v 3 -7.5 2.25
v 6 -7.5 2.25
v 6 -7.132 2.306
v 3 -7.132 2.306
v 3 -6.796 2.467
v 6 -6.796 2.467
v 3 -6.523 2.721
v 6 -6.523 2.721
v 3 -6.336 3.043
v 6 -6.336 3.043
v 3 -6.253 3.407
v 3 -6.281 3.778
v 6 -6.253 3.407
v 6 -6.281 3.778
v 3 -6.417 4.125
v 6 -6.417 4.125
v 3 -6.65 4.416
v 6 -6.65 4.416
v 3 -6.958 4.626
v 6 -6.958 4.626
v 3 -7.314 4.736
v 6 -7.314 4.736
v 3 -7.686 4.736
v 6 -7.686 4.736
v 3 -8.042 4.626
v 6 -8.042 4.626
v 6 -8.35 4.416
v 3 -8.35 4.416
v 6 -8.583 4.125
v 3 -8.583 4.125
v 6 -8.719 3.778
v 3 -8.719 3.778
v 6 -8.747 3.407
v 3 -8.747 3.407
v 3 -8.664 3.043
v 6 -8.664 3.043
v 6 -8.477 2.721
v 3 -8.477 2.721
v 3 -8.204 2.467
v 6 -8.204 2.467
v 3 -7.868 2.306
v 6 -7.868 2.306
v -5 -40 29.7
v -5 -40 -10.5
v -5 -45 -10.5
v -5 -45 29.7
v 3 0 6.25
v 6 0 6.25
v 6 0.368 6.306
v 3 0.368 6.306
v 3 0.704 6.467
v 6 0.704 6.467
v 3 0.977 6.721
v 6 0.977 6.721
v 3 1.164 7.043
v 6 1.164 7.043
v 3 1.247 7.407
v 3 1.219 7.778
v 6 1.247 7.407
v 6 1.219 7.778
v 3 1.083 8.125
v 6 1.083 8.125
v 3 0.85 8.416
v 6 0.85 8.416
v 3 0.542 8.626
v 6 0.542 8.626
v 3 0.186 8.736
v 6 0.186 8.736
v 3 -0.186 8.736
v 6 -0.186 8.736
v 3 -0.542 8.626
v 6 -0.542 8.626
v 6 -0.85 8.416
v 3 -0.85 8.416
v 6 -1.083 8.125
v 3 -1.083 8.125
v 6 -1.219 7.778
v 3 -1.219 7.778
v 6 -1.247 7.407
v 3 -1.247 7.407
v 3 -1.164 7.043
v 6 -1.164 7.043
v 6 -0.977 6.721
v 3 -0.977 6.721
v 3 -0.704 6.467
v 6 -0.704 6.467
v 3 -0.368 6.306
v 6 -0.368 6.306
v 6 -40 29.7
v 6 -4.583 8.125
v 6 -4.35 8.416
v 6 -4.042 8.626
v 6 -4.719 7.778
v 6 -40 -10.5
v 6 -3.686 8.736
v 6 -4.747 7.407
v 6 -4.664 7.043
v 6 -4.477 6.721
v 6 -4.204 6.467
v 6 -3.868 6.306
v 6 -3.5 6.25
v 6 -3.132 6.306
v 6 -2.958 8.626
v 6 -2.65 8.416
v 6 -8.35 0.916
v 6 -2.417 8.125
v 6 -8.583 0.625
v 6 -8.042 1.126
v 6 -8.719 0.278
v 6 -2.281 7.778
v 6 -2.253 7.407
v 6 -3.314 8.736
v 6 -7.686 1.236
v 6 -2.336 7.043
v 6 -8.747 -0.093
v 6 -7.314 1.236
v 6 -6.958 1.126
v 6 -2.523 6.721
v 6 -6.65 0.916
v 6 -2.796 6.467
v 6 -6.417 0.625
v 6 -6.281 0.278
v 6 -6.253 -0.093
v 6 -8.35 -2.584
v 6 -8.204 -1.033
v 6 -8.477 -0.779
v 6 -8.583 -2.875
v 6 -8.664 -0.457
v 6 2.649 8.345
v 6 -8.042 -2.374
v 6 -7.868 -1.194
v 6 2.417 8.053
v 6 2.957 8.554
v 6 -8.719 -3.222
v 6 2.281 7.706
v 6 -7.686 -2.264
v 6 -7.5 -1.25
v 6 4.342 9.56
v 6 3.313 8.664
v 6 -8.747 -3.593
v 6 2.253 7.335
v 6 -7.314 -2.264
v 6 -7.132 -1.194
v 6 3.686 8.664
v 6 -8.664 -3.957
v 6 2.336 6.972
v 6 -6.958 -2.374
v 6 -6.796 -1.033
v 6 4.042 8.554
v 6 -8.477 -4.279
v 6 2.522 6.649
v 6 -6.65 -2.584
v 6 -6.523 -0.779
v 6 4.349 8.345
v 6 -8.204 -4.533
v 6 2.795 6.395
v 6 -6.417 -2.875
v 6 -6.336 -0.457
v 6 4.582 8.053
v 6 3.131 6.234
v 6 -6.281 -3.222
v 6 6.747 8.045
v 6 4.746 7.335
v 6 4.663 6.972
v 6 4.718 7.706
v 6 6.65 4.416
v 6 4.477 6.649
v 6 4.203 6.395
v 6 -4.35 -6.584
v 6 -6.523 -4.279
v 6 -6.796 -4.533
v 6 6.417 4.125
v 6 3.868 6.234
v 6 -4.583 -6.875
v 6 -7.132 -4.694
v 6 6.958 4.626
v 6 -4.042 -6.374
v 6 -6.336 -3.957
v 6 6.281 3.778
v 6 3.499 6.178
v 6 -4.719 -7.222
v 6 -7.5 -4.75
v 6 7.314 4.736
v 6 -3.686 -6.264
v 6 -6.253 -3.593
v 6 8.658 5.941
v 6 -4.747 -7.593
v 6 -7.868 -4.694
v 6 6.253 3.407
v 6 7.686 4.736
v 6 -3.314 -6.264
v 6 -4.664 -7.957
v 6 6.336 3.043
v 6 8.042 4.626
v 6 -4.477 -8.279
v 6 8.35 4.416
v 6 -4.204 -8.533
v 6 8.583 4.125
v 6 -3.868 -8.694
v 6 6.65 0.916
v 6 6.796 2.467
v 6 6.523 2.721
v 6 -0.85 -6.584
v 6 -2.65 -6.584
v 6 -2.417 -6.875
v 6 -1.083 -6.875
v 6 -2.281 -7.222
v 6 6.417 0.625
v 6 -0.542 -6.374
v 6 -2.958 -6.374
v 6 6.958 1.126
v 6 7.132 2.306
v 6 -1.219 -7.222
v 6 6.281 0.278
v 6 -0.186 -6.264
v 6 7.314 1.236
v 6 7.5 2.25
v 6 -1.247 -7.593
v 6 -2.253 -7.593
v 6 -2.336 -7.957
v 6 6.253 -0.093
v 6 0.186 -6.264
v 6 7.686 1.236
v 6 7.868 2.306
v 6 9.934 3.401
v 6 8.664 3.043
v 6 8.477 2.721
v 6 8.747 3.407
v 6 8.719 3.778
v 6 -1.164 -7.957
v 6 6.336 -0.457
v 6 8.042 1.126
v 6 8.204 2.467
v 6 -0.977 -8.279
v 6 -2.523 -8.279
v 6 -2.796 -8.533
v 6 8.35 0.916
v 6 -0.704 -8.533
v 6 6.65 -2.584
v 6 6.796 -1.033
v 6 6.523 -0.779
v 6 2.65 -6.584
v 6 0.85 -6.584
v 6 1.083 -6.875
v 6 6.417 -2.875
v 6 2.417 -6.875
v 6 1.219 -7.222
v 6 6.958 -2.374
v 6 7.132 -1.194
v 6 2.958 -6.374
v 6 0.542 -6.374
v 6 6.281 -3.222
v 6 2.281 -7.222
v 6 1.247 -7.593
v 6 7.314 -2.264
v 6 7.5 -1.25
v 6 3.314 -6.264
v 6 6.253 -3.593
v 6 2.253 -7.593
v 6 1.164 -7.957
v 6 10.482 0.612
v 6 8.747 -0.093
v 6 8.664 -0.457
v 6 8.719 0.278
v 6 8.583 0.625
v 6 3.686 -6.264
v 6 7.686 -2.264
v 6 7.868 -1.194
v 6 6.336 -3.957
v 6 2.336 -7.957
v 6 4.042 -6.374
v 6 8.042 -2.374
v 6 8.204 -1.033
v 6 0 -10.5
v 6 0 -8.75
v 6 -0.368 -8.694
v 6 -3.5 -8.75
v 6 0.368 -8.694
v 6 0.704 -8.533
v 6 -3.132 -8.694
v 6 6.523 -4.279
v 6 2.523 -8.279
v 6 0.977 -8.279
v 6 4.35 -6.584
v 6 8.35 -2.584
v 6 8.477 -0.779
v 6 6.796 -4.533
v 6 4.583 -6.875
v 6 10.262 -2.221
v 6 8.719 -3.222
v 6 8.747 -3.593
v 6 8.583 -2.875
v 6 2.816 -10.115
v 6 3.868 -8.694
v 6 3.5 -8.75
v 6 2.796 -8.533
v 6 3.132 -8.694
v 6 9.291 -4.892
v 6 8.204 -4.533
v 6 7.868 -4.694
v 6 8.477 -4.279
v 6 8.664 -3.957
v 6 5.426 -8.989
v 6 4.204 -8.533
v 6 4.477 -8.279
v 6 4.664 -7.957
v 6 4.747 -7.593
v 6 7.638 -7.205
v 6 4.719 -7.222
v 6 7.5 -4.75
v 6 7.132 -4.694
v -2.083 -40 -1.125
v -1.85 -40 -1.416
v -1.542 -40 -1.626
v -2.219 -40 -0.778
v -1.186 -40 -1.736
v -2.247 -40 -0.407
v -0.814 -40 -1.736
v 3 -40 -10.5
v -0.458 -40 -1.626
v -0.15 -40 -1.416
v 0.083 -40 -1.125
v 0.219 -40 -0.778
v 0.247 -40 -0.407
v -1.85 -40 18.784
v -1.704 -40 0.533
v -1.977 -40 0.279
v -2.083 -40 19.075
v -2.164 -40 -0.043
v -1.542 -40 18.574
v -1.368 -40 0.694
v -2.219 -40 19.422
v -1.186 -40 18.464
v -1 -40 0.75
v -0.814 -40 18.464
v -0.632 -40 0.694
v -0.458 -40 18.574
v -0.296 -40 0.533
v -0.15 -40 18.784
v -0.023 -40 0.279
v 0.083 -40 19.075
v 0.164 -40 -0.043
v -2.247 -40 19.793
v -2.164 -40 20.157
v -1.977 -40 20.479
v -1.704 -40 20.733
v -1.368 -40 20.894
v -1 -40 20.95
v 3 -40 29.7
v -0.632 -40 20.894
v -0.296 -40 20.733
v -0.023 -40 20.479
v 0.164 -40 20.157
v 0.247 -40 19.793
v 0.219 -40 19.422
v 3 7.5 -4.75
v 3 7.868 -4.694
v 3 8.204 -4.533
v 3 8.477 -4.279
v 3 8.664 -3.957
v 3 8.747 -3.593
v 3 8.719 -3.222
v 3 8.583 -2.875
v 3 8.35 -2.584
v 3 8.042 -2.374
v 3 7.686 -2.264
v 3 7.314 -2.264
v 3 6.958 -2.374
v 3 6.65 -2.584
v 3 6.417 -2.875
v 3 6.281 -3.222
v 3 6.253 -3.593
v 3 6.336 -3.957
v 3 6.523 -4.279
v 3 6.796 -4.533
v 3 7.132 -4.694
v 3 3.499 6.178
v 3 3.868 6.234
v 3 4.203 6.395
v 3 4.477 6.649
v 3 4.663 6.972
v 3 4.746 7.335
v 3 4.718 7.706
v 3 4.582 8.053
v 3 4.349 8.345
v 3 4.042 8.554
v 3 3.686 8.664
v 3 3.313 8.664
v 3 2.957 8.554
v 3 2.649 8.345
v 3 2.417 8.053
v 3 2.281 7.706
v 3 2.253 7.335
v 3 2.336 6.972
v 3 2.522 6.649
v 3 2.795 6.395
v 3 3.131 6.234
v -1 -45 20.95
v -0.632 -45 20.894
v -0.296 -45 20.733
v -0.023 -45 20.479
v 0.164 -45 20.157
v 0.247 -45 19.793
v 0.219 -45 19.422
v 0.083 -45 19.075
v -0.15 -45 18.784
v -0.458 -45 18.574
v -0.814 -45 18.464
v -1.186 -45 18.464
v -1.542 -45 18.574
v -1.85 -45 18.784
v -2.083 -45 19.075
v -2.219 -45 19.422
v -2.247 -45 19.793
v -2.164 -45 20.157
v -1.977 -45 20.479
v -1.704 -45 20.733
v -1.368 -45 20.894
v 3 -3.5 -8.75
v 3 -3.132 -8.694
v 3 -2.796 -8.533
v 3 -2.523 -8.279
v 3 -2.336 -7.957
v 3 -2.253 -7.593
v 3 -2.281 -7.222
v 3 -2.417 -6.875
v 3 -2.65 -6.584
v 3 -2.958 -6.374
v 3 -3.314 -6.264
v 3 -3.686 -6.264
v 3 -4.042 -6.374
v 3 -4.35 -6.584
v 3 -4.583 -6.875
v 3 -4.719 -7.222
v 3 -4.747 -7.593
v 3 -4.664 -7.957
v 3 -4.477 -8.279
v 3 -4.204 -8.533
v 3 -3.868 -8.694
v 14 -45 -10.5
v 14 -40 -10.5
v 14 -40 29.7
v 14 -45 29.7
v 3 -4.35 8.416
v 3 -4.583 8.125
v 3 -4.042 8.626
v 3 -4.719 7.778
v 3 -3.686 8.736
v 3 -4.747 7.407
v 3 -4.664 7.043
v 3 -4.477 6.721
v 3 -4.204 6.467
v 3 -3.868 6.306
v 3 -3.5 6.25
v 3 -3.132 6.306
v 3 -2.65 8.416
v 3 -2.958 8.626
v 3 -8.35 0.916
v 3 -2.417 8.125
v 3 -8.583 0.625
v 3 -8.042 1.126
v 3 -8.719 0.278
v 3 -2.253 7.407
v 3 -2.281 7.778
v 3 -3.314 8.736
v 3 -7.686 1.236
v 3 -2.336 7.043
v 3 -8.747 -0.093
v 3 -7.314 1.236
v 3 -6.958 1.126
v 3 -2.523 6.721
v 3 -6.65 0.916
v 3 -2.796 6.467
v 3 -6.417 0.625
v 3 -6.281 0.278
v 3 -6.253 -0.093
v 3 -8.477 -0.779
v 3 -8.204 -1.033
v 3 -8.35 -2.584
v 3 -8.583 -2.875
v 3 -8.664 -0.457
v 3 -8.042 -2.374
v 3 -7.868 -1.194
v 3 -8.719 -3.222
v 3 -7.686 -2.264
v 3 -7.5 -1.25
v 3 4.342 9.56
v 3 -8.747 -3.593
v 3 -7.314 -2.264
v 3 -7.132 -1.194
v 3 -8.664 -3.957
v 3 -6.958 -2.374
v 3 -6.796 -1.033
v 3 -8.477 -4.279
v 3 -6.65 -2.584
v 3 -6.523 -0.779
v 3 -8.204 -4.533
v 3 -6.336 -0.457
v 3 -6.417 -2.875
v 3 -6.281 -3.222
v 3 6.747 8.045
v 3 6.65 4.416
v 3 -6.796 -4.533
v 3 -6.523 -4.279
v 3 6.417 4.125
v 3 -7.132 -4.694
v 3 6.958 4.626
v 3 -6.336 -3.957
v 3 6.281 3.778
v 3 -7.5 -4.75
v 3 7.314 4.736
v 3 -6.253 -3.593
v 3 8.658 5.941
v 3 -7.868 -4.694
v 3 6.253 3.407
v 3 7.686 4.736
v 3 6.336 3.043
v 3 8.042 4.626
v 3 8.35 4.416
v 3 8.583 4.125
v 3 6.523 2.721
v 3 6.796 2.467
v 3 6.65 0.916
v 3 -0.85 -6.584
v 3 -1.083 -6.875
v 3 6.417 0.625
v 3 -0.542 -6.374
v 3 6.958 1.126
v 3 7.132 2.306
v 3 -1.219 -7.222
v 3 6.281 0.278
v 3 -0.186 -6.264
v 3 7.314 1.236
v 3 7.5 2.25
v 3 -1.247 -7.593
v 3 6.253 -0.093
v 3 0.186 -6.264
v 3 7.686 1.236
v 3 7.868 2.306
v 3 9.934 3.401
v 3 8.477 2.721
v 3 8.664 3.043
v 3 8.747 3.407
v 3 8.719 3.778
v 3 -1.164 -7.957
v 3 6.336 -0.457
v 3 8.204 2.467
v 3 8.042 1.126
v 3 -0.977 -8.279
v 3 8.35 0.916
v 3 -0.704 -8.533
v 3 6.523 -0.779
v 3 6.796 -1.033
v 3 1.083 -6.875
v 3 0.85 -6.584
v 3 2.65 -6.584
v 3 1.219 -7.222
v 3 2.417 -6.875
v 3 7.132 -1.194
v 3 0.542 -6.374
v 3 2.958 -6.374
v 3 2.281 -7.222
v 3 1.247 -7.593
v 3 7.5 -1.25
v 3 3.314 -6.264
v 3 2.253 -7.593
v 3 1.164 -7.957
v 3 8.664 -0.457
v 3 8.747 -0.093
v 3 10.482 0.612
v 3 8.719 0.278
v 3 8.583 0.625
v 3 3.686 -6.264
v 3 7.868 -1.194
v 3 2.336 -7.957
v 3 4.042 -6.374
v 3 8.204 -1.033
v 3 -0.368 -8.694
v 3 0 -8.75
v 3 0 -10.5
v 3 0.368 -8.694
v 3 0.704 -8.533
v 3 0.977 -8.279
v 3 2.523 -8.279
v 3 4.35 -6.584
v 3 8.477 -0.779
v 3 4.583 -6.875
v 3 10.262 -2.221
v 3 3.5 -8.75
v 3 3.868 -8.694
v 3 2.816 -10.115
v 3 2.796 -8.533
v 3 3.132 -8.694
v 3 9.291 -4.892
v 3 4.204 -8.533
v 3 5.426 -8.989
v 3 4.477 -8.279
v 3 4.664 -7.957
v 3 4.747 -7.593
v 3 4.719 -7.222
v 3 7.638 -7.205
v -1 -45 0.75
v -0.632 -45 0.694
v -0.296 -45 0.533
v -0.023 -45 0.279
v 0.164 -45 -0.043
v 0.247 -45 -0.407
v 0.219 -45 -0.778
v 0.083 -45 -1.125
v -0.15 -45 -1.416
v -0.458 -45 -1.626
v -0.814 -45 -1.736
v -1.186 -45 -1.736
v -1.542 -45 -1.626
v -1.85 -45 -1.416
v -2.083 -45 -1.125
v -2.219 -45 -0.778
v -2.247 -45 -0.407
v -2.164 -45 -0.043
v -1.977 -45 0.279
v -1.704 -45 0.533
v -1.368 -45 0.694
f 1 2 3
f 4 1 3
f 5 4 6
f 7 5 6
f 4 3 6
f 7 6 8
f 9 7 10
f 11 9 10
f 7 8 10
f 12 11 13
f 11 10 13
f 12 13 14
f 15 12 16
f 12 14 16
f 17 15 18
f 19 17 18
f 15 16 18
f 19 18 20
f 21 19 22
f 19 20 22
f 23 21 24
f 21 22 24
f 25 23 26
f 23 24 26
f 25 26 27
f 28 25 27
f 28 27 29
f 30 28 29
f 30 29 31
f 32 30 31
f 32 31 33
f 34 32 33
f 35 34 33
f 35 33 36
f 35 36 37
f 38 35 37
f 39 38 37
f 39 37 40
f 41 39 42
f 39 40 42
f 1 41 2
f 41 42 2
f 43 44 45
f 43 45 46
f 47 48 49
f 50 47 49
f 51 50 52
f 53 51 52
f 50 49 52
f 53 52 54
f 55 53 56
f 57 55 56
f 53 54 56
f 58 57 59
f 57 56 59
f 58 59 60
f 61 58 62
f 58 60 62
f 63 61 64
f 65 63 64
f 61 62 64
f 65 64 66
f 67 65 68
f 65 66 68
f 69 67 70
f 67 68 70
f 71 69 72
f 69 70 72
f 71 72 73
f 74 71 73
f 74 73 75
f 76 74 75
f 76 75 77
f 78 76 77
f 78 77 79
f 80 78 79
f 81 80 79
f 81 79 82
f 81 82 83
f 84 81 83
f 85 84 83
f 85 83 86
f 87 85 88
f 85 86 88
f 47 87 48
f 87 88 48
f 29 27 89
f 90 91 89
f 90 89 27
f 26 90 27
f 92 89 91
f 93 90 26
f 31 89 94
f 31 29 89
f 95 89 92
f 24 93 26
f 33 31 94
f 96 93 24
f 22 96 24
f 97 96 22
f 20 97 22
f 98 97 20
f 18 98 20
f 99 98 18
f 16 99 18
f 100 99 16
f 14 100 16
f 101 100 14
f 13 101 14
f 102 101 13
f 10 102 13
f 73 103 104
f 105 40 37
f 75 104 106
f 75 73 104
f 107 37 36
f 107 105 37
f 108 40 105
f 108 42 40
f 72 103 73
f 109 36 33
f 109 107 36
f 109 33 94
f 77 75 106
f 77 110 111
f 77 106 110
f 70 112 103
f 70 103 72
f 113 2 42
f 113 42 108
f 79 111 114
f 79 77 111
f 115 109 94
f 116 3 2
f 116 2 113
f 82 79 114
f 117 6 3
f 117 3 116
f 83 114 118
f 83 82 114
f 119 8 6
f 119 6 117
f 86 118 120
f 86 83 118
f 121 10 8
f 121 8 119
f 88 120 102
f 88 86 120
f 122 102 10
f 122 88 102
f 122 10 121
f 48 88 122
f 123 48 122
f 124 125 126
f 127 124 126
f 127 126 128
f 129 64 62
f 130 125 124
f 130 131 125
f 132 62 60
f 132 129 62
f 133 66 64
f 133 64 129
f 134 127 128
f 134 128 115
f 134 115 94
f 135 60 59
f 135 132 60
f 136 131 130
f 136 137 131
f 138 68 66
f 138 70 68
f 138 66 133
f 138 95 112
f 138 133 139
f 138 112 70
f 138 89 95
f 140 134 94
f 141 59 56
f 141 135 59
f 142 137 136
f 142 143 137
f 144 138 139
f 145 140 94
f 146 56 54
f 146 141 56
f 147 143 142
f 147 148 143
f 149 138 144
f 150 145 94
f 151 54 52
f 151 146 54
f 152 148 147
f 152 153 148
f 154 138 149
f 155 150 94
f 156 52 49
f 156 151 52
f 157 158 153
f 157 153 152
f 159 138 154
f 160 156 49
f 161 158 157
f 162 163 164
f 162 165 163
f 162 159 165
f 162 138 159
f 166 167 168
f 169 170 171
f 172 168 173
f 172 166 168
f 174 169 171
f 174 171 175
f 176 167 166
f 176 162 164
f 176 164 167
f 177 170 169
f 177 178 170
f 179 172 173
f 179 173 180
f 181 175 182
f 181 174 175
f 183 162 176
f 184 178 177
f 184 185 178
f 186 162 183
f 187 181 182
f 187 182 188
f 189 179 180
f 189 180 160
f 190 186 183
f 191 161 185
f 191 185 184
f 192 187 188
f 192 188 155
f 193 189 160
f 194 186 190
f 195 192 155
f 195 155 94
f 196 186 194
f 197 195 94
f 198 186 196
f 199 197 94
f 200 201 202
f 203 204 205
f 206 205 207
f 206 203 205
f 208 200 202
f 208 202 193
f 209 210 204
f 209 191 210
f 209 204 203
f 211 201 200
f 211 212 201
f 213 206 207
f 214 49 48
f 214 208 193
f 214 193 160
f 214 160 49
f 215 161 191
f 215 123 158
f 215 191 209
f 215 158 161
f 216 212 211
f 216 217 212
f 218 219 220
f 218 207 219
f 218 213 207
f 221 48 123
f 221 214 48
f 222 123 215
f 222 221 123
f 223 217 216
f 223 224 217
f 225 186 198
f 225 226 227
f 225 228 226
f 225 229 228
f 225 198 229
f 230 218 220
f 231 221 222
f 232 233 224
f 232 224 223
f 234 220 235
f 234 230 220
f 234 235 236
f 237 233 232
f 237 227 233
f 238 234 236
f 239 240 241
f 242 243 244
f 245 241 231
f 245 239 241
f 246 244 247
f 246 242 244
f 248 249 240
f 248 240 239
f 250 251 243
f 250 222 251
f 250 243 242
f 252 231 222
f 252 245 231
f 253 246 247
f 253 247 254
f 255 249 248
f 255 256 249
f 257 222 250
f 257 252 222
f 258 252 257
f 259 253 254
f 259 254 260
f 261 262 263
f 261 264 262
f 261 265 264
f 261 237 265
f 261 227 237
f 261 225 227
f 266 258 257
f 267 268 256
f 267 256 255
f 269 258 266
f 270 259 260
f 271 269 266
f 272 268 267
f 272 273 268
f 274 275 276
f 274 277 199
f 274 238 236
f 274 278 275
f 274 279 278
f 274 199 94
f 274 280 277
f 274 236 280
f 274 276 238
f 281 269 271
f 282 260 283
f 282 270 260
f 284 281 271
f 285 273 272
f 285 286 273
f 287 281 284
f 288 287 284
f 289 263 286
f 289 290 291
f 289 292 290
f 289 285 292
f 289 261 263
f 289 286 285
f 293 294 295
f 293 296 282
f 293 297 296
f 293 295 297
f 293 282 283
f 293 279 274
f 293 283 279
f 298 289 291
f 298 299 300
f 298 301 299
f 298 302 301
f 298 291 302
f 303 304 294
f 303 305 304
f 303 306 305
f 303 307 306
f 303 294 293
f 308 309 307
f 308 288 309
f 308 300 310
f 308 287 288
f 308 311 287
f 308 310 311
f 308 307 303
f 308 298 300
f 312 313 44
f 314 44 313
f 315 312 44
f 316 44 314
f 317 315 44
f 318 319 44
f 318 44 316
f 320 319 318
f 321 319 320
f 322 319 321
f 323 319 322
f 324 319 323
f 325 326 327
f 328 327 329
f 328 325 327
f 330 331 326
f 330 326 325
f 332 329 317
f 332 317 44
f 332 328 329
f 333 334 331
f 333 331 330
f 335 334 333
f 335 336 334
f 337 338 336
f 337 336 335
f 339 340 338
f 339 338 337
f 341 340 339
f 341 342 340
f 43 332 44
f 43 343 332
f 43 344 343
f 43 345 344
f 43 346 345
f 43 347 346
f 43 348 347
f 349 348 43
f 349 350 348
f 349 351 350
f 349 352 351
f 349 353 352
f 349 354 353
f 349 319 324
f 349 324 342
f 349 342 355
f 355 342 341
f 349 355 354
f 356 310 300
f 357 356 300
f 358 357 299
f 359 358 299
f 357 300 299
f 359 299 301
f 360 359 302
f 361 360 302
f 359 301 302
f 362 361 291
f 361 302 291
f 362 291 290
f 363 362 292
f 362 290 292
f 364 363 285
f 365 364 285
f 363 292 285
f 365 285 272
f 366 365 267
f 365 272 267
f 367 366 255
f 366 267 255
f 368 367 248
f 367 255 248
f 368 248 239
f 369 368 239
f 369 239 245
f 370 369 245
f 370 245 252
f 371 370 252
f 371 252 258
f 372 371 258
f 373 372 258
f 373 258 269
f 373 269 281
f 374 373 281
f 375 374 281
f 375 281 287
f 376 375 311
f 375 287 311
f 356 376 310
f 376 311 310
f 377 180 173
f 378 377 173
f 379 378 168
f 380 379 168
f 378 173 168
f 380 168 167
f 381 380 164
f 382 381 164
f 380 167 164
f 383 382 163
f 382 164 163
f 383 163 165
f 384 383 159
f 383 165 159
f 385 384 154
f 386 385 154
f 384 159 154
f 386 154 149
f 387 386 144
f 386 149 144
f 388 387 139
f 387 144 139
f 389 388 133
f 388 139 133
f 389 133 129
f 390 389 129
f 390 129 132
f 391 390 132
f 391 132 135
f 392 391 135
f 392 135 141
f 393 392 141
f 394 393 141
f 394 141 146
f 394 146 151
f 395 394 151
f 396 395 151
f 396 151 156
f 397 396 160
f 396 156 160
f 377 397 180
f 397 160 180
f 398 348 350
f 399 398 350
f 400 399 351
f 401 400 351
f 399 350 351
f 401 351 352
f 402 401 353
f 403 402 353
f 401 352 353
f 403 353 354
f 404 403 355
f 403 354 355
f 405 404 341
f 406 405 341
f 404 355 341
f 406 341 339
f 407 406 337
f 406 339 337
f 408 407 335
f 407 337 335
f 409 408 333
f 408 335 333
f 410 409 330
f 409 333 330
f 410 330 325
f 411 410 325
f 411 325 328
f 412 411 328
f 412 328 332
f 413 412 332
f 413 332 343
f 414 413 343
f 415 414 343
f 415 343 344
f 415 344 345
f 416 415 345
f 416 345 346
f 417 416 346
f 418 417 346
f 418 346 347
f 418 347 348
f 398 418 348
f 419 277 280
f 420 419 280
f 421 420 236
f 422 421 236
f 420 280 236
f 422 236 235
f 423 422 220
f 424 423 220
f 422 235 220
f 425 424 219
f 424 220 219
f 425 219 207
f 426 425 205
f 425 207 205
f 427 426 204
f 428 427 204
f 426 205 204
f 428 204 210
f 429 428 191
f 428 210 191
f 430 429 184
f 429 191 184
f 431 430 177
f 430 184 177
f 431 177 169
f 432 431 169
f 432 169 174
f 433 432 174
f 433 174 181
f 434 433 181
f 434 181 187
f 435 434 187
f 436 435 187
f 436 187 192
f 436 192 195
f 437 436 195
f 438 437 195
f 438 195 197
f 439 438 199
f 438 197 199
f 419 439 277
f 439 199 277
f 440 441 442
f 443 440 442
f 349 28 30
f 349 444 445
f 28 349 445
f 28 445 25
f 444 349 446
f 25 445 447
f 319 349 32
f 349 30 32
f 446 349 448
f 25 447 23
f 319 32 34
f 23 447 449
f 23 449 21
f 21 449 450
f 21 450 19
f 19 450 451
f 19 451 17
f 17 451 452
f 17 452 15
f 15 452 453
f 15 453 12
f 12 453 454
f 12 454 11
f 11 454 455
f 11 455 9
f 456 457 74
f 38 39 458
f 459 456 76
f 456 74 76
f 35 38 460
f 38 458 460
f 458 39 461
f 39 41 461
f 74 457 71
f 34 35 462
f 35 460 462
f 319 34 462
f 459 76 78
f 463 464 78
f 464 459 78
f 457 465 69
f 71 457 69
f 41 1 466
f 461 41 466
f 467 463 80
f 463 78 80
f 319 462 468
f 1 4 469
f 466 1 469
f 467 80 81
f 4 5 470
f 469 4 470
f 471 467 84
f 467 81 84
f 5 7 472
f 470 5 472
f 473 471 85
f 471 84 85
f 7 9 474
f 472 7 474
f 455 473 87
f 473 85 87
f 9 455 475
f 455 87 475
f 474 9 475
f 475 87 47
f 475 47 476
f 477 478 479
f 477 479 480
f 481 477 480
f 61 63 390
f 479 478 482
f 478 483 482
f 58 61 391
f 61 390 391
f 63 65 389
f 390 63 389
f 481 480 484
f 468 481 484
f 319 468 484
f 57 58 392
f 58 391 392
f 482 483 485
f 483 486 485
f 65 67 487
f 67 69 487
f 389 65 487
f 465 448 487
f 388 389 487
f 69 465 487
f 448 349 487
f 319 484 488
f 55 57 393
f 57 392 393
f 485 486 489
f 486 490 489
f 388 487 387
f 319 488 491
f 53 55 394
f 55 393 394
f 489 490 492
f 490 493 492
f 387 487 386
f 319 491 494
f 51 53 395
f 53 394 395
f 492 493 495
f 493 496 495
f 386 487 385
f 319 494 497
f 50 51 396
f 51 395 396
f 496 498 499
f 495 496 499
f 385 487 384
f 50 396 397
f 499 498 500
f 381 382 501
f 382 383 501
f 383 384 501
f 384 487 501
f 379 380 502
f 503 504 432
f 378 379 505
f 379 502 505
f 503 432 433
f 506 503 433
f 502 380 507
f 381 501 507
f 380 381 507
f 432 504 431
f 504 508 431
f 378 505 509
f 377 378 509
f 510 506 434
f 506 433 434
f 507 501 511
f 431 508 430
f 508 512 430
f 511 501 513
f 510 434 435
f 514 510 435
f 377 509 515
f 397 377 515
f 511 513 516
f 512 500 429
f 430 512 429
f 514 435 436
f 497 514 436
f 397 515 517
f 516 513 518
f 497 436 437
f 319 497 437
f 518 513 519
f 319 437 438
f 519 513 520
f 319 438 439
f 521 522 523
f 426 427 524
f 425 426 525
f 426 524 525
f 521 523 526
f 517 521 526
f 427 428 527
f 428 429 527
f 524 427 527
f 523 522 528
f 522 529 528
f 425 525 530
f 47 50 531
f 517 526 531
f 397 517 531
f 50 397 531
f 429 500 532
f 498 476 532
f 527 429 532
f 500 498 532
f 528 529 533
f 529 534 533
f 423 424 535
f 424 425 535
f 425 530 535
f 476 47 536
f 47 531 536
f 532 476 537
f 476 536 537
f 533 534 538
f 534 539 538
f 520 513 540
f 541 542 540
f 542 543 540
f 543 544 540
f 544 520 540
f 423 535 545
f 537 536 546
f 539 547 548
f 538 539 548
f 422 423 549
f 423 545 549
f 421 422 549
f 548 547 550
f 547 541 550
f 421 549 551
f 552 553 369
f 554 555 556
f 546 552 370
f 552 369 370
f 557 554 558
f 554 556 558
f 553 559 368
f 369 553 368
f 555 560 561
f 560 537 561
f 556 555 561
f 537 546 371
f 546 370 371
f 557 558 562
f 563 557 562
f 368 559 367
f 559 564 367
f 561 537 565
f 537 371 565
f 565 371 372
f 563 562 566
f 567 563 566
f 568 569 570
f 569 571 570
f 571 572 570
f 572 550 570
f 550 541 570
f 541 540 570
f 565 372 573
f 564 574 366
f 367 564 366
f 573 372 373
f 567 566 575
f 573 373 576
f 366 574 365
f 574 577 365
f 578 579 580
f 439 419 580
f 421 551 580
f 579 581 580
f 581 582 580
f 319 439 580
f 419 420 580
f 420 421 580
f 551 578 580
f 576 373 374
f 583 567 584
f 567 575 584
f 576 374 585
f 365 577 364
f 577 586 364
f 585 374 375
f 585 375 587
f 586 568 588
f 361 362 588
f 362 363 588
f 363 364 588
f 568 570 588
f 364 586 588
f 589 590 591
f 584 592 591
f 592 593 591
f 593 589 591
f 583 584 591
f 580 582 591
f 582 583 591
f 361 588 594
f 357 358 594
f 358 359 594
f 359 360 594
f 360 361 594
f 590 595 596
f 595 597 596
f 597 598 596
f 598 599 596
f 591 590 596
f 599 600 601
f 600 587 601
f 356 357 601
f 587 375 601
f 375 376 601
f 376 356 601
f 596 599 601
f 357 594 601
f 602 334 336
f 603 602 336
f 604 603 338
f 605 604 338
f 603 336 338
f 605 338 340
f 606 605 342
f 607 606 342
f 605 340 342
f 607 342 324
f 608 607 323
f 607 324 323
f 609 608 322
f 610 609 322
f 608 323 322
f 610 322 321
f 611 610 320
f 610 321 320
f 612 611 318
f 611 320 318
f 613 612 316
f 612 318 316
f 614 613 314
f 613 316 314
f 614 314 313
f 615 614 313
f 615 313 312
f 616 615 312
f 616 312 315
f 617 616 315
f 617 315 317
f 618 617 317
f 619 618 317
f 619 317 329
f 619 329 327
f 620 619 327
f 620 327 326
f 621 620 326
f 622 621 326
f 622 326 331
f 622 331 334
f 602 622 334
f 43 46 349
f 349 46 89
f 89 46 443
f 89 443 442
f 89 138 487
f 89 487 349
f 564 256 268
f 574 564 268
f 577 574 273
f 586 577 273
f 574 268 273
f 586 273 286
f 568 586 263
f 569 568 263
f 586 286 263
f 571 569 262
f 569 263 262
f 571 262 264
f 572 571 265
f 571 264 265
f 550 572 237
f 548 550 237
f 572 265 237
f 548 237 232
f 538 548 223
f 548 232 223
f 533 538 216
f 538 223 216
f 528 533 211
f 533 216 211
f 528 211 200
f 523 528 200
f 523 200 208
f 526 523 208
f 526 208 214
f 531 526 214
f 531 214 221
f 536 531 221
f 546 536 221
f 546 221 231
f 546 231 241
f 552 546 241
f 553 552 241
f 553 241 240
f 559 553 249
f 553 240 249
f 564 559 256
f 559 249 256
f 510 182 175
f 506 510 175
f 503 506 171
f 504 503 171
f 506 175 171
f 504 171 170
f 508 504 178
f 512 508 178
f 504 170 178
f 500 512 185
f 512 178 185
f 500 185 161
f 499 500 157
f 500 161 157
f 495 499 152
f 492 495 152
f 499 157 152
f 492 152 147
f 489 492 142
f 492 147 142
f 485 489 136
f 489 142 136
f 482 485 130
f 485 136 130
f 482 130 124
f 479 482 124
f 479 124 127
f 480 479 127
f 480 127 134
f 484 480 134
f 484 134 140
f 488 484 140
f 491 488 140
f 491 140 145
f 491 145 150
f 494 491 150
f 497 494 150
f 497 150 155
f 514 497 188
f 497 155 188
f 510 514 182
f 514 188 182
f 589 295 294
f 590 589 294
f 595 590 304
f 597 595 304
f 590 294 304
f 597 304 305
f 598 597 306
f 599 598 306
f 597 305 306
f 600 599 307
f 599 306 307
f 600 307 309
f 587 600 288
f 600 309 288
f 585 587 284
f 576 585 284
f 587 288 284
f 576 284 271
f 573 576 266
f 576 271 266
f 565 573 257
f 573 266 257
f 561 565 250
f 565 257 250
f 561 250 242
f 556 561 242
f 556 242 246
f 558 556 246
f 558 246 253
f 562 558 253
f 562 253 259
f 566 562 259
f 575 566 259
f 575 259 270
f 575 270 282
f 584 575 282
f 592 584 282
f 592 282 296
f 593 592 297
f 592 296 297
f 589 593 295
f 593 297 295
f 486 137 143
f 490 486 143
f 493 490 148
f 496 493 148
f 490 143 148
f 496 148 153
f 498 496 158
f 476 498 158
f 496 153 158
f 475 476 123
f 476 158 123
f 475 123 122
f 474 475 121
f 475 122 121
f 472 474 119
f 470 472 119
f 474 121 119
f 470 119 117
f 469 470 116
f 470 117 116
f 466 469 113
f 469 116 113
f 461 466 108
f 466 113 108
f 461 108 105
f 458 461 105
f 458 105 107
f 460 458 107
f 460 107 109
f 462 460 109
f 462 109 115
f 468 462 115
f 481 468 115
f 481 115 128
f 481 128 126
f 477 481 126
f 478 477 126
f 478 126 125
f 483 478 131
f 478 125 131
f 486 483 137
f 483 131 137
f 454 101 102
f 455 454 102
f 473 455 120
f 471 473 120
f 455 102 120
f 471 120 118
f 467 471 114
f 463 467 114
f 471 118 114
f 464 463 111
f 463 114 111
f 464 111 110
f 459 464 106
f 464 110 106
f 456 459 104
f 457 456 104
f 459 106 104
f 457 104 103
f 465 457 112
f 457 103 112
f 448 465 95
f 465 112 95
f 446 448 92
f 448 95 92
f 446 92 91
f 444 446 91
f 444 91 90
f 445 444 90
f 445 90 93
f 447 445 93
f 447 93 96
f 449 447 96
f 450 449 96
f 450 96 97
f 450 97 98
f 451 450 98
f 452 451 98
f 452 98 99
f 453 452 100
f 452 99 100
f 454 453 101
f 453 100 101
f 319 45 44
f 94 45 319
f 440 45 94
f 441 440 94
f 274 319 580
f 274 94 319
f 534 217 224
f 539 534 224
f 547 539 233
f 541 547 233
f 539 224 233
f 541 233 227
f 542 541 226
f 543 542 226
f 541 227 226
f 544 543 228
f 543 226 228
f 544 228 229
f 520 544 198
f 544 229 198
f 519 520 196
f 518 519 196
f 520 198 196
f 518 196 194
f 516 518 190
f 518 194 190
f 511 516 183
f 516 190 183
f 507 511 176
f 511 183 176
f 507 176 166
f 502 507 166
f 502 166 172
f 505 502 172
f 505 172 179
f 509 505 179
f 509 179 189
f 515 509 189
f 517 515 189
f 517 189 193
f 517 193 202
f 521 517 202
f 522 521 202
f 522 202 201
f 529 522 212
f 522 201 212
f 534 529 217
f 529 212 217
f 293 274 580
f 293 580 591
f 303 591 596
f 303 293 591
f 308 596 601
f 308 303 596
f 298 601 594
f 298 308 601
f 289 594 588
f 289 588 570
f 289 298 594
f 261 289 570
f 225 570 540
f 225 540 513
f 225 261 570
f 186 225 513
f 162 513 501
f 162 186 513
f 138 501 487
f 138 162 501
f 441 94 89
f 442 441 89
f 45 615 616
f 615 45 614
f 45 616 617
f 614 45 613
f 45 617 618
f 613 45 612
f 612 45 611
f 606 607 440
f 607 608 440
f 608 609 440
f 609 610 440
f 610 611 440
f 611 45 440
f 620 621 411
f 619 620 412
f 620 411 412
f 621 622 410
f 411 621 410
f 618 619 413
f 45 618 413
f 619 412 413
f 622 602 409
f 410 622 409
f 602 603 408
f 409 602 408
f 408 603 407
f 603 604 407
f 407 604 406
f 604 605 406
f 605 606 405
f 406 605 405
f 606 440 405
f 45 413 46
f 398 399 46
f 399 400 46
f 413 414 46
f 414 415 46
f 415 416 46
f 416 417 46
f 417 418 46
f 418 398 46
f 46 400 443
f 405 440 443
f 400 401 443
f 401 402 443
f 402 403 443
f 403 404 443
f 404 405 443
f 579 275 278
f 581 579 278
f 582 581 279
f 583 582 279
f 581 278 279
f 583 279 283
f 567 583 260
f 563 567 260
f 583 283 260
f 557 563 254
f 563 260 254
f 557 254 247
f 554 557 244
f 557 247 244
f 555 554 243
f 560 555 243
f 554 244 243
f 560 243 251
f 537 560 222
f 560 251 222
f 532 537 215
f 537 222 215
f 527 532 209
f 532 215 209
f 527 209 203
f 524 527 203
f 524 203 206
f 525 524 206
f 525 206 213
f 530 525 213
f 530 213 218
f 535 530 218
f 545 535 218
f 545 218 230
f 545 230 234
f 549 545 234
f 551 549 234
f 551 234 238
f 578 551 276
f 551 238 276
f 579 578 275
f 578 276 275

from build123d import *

# Parameters (mm, degrees)
SKETCH1_R           = 1.25
BOSS_EXTRUDE1_DEPTH = 3
SKETCH2_W           = 3
SKETCH2_H           = 40.2
BOSS_EXTRUDE2_DEPTH = 5
SKETCH4_W           = 40.2
SKETCH4_H           = 5
BOSS_EXTRUDE3_DEPTH = 8
SKETCH7_W           = 40.2
SKETCH7_H           = 5
BOSS_EXTRUDE4_DEPTH = 8
SKETCH9_R           = 1.25
CUT_EXTRUDE1_DEPTH  = 8


with BuildPart() as part:
    # Sketch1 → Boss-Extrude1 (new body)
    # profile 1 of 2: a face of its own
    with BuildSketch(Plane(origin=(0, 0, 0), x_dir=(0, 0, -1), z_dir=(1, 0, 0))):
        with BuildLine():
            Line((10.5, -40), (10.5, 0))
            ThreePointArc((10.5, 0), (-2.221347256, -10.262339712), (-9.560117404, 4.342137172))
            Line((-9.560117404, 4.342137172), (-29.7, -40))
            Line((-29.7, -40), (10.5, -40))
        make_face()
    # profile 2 of 2: a face of its own
    with BuildSketch(Plane(origin=(0, 0, 0), x_dir=(0, 0, -1), z_dir=(1, 0, 0))):
        with BuildLine():
            ThreePointArc((-9.560117404, 4.342137172), (-2.221347256, -10.262339712), (10.5, 0))
            ThreePointArc((10.5, 0), (2.221347256, 10.262339712), (-9.560117404, 4.342137172))
        make_face()
        with Locations((-7.5, -3.5)):
            Circle(SKETCH1_R, mode=Mode.SUBTRACT)
        with Locations((-3.5, -7.5)):
            Circle(SKETCH1_R, mode=Mode.SUBTRACT)
        with Locations((0, -7.5)):
            Circle(SKETCH1_R, mode=Mode.SUBTRACT)
        with Locations((3.5, -7.5)):
            Circle(SKETCH1_R, mode=Mode.SUBTRACT)
        with Locations((7.5, -3.5)):
            Circle(SKETCH1_R, mode=Mode.SUBTRACT)
        with Locations((-7.5, 0)):
            Circle(SKETCH1_R, mode=Mode.SUBTRACT)
        with Locations((-7.428270452, 3.499264905)):
            Circle(SKETCH1_R, mode=Mode.SUBTRACT)
        with Locations((-3.5, 7.5)):
            Circle(SKETCH1_R, mode=Mode.SUBTRACT)
        with Locations((0, 7.5)):
            Circle(SKETCH1_R, mode=Mode.SUBTRACT)
        with Locations((7.5, 0)):
            Circle(SKETCH1_R, mode=Mode.SUBTRACT)
        with Locations((7.5, 3.5)):
            Circle(SKETCH1_R, mode=Mode.SUBTRACT)
        with Locations((3.5, 7.5)):
            Circle(SKETCH1_R, mode=Mode.SUBTRACT)
    extrude(amount=BOSS_EXTRUDE1_DEPTH)

    # Sketch2 → Boss-Extrude2 (add)
    with BuildSketch(Plane(origin=(0, -40, 0), x_dir=(-1, 0, 0), z_dir=(0, -1, 0))):
        with Locations((-1.5, -9.6)):
            Rectangle(SKETCH2_W, SKETCH2_H)
    extrude(amount=BOSS_EXTRUDE2_DEPTH)

    # Sketch4 → Boss-Extrude3 (add)
    with BuildSketch(Plane.ZY):
        with Locations((9.6, -42.5)):
            Rectangle(SKETCH4_W, SKETCH4_H)
    extrude(amount=BOSS_EXTRUDE3_DEPTH)


with BuildPart() as body_2:
    # Mirror1: mirrored copy
    add(part.part.mirror(Plane(origin=(3, 0, 0), x_dir=(0, 0, 1), z_dir=(1, 0, 0))))

    # Sketch7 → Boss-Extrude4 (add)
    with BuildSketch(Plane.ZY.offset(-3)):
        with Locations((9.6, -42.5)):
            Rectangle(SKETCH7_W, SKETCH7_H)
    extrude(amount=BOSS_EXTRUDE4_DEPTH)

    # Sketch9 → Cut-Extrude1 (cut)
    with BuildSketch(Plane(origin=(0, -40, 0), x_dir=(1, 0, 0), z_dir=(0, 1, 0))):
        with Locations(Location((-1, 0.5, 0), (0, 0, 270))):
            Circle(SKETCH9_R)
        with Locations(Location((-1, -19.7, 0), (0, 0, 270))):
            Circle(SKETCH9_R)
    extrude(amount=-CUT_EXTRUDE1_DEPTH, mode=Mode.SUBTRACT)


solid = body_2.part
